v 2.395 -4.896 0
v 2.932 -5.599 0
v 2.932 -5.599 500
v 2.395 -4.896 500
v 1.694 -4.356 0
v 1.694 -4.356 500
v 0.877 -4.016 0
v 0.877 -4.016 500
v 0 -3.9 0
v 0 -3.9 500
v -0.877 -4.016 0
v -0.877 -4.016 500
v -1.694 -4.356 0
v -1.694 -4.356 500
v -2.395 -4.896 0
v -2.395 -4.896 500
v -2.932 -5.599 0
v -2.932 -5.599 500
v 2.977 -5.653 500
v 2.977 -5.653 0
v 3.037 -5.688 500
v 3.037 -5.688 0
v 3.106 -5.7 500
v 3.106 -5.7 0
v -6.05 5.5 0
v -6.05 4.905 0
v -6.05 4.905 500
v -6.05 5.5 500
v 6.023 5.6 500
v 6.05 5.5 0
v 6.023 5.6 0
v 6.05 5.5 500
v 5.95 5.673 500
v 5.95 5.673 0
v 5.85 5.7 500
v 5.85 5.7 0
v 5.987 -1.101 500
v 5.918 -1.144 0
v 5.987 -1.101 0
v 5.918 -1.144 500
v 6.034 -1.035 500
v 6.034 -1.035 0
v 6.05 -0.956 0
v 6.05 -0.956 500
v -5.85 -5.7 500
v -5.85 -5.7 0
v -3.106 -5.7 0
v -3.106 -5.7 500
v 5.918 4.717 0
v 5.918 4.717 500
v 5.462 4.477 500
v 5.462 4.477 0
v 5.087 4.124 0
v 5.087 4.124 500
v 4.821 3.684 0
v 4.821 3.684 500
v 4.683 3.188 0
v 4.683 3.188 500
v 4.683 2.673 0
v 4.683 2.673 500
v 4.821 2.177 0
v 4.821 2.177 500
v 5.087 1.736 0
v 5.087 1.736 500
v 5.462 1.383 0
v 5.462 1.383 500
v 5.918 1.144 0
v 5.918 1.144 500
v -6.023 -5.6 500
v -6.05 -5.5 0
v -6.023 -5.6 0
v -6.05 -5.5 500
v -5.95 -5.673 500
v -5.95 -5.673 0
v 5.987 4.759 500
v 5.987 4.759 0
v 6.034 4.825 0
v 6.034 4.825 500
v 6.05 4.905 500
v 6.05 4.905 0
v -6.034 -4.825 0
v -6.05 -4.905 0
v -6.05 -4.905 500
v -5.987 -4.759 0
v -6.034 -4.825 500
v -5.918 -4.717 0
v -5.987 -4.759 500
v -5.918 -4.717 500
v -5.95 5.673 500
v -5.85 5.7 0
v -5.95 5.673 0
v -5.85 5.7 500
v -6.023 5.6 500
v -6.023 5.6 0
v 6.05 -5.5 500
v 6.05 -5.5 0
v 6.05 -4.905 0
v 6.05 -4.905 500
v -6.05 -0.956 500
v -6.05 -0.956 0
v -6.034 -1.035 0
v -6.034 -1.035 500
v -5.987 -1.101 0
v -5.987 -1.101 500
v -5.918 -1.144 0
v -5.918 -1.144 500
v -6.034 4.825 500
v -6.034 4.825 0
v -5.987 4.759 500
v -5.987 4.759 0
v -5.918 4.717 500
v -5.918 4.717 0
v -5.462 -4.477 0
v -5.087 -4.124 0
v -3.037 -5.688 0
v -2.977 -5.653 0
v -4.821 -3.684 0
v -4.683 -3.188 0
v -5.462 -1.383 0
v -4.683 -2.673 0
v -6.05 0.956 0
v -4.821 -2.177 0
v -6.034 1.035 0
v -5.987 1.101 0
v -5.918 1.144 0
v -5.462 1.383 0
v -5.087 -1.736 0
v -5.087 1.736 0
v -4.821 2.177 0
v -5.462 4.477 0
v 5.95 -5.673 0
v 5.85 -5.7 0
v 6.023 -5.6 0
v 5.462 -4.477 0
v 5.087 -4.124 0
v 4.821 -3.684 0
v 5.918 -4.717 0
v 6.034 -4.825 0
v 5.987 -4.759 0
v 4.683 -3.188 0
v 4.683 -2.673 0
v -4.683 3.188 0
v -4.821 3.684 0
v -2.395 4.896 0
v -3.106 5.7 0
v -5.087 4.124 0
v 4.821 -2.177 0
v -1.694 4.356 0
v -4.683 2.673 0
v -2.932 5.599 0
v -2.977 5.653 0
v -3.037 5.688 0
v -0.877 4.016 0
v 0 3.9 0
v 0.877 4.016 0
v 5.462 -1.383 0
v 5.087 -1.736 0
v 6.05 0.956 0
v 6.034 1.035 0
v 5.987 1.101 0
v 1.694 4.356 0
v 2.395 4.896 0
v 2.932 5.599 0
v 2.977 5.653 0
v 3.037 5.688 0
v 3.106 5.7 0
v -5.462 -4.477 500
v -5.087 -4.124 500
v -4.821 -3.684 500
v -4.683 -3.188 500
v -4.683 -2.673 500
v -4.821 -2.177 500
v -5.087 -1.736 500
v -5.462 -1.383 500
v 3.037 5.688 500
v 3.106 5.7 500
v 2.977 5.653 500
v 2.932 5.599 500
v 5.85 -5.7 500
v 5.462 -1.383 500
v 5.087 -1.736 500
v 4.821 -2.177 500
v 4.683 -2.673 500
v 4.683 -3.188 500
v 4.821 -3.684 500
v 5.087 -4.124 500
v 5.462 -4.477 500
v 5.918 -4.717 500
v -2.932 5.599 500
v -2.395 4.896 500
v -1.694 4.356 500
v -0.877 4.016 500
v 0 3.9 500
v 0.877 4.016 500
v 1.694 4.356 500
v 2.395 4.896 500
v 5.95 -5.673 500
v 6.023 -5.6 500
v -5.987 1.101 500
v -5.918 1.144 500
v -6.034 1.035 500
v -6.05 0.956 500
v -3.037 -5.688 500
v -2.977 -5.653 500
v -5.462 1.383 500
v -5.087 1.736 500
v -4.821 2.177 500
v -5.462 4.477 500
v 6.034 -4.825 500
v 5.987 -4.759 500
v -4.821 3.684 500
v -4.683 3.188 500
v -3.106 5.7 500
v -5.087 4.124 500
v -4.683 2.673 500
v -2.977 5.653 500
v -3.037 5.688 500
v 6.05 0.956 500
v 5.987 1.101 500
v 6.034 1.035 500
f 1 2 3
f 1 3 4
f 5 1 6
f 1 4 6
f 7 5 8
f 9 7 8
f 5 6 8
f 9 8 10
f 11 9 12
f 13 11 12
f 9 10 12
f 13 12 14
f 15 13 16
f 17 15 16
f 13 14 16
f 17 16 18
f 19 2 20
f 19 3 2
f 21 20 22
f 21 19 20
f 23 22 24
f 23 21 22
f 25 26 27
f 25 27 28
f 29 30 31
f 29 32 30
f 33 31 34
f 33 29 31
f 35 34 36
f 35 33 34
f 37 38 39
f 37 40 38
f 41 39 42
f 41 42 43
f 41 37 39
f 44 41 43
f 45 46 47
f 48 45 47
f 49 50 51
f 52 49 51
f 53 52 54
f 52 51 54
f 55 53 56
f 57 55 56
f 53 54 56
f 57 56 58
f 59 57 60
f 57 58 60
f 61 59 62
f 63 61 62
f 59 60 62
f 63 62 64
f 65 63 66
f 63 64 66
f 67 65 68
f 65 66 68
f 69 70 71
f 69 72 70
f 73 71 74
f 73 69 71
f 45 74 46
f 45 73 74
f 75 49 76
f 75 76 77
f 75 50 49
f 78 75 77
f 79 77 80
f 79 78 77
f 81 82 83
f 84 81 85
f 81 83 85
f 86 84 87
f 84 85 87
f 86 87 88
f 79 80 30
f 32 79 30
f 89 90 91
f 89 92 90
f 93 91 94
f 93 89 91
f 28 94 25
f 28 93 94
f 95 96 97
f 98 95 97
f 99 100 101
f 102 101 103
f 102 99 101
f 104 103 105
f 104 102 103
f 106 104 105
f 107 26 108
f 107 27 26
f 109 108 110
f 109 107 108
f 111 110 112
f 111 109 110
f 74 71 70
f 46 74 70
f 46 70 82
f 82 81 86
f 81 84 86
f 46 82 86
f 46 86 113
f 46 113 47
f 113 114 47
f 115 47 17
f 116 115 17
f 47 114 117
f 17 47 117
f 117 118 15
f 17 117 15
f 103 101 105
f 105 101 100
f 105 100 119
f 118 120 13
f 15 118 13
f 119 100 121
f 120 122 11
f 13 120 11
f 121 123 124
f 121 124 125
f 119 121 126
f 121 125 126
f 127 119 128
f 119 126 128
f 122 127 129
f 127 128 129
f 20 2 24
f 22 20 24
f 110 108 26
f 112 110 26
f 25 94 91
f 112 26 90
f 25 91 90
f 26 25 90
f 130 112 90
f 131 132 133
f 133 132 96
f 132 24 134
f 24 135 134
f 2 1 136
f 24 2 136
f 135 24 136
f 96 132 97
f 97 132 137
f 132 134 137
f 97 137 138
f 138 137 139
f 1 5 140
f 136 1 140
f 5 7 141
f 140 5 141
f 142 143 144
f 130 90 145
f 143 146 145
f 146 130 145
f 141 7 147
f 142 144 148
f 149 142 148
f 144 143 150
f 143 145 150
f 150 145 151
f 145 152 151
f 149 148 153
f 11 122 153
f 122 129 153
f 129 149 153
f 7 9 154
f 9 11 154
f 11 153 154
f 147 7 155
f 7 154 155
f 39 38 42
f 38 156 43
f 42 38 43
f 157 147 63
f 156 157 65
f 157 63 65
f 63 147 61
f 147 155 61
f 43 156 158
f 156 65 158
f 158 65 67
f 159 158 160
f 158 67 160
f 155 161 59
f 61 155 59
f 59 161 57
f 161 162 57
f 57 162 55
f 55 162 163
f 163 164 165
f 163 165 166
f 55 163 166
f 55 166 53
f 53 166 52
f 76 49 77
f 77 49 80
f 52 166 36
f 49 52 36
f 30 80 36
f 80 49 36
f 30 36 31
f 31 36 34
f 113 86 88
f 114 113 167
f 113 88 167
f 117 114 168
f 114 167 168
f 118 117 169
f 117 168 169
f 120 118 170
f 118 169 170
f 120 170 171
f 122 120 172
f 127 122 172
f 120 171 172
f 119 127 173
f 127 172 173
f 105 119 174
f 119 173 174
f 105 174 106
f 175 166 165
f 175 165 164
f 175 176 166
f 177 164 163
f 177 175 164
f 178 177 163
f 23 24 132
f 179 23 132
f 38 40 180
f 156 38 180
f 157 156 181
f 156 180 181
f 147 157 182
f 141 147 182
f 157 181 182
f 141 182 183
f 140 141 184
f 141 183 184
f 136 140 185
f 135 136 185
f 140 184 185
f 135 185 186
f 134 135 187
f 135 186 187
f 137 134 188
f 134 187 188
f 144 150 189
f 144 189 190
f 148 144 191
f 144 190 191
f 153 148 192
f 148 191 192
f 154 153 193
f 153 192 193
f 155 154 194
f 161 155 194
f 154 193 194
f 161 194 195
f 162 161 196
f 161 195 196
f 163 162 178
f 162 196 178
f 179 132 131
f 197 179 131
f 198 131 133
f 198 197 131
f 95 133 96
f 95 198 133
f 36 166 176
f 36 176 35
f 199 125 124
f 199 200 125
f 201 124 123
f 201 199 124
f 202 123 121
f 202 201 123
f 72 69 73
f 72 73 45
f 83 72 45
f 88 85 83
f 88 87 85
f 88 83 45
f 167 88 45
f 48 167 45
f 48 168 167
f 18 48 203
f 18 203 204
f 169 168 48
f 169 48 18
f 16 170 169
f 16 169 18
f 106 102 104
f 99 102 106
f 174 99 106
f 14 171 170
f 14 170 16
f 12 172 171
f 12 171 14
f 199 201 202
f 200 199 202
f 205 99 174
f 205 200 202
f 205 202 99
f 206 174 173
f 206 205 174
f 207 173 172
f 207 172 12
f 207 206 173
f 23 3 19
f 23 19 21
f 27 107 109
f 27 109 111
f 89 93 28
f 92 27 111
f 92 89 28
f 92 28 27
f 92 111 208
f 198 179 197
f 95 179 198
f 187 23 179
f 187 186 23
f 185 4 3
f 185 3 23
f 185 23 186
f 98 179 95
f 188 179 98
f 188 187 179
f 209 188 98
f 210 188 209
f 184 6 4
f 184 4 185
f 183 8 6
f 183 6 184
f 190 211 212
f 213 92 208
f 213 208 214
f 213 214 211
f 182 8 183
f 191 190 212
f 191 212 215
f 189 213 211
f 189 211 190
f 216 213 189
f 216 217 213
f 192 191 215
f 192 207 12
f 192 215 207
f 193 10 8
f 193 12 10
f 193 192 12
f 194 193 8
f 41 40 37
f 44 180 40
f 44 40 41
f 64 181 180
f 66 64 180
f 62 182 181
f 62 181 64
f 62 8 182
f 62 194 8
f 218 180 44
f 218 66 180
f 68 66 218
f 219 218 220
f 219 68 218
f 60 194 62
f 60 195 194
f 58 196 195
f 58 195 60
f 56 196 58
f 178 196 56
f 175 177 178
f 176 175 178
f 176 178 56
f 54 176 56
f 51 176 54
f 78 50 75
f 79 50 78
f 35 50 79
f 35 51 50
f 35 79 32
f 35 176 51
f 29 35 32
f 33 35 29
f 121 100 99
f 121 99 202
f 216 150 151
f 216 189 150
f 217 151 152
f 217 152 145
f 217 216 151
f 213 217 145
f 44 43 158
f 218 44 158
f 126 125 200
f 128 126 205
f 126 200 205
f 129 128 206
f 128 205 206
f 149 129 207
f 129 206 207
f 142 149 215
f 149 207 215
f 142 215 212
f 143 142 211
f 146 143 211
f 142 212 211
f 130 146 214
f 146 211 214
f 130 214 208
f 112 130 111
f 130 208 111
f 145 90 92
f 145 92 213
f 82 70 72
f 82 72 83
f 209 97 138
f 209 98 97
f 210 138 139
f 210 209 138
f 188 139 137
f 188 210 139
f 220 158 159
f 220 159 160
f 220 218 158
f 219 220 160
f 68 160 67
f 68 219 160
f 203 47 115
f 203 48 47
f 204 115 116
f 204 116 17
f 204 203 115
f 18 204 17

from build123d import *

# Parameters (mm, degrees)
SKETCH1_W           = 12.1
SKETCH1_H           = 11.4
BOSS_EXTRUDE1_DEPTH = 500
SKETCH2_R           = 3.379
SKETCH2_R_2         = 1.9
CUT_EXTRUDE1_DEPTH  = 501.069087727
FILLET1_R           = 0.2


with BuildPart() as part:
    # Sketch1 → Boss-Extrude1 (new body)
    with BuildSketch(Plane.XY):
        Rectangle(SKETCH1_W, SKETCH1_H)
    extrude(amount=BOSS_EXTRUDE1_DEPTH)

    # Sketch2 → Cut-Extrude1 (cut, through all)
    with BuildSketch(Plane.XY.offset(500)):
        with Locations((0, 7.279)):
            Circle(SKETCH2_R)
        with Locations((0, -7.279)):
            Circle(SKETCH2_R)
        with Locations((-6.565, 2.930166572)):
            Circle(SKETCH2_R_2)
        with Locations((-6.565, -2.930166572)):
            Circle(SKETCH2_R_2)
        with Locations((6.565, -2.930166572)):
            Circle(SKETCH2_R_2)
        with Locations((6.565, 2.930166572)):
            Circle(SKETCH2_R_2)
    extrude(amount=-CUT_EXTRUDE1_DEPTH, mode=Mode.SUBTRACT)

    # Fillet1
    fillet1_edges = [part.edges().sort_by_distance(p)[0] for p in [
        (6.05, -4.759039176, 250),
        (6.05, -1.101293968, 250),
        (-6.05, -1.101293968, 250),
        (-6.05, -4.759039176, 250),
        (-6.05, 4.759039176, 250),
        (-6.05, 1.101293968, 250),
        (-2.987373428, -5.7, 250),
        (2.987373428, -5.7, 250),
        (6.05, 1.101293968, 250),
        (6.05, 4.759039176, 250),
        (2.987373428, 5.7, 250),
        (-2.987373428, 5.7, 250),
        (6.05, -5.7, 250),
        (-6.05, -5.7, 250),
        (-6.05, 5.7, 250),
        (6.05, 5.7, 250),
    ]]
    fillet(fillet1_edges, radius=FILLET1_R)


solid = part.part
